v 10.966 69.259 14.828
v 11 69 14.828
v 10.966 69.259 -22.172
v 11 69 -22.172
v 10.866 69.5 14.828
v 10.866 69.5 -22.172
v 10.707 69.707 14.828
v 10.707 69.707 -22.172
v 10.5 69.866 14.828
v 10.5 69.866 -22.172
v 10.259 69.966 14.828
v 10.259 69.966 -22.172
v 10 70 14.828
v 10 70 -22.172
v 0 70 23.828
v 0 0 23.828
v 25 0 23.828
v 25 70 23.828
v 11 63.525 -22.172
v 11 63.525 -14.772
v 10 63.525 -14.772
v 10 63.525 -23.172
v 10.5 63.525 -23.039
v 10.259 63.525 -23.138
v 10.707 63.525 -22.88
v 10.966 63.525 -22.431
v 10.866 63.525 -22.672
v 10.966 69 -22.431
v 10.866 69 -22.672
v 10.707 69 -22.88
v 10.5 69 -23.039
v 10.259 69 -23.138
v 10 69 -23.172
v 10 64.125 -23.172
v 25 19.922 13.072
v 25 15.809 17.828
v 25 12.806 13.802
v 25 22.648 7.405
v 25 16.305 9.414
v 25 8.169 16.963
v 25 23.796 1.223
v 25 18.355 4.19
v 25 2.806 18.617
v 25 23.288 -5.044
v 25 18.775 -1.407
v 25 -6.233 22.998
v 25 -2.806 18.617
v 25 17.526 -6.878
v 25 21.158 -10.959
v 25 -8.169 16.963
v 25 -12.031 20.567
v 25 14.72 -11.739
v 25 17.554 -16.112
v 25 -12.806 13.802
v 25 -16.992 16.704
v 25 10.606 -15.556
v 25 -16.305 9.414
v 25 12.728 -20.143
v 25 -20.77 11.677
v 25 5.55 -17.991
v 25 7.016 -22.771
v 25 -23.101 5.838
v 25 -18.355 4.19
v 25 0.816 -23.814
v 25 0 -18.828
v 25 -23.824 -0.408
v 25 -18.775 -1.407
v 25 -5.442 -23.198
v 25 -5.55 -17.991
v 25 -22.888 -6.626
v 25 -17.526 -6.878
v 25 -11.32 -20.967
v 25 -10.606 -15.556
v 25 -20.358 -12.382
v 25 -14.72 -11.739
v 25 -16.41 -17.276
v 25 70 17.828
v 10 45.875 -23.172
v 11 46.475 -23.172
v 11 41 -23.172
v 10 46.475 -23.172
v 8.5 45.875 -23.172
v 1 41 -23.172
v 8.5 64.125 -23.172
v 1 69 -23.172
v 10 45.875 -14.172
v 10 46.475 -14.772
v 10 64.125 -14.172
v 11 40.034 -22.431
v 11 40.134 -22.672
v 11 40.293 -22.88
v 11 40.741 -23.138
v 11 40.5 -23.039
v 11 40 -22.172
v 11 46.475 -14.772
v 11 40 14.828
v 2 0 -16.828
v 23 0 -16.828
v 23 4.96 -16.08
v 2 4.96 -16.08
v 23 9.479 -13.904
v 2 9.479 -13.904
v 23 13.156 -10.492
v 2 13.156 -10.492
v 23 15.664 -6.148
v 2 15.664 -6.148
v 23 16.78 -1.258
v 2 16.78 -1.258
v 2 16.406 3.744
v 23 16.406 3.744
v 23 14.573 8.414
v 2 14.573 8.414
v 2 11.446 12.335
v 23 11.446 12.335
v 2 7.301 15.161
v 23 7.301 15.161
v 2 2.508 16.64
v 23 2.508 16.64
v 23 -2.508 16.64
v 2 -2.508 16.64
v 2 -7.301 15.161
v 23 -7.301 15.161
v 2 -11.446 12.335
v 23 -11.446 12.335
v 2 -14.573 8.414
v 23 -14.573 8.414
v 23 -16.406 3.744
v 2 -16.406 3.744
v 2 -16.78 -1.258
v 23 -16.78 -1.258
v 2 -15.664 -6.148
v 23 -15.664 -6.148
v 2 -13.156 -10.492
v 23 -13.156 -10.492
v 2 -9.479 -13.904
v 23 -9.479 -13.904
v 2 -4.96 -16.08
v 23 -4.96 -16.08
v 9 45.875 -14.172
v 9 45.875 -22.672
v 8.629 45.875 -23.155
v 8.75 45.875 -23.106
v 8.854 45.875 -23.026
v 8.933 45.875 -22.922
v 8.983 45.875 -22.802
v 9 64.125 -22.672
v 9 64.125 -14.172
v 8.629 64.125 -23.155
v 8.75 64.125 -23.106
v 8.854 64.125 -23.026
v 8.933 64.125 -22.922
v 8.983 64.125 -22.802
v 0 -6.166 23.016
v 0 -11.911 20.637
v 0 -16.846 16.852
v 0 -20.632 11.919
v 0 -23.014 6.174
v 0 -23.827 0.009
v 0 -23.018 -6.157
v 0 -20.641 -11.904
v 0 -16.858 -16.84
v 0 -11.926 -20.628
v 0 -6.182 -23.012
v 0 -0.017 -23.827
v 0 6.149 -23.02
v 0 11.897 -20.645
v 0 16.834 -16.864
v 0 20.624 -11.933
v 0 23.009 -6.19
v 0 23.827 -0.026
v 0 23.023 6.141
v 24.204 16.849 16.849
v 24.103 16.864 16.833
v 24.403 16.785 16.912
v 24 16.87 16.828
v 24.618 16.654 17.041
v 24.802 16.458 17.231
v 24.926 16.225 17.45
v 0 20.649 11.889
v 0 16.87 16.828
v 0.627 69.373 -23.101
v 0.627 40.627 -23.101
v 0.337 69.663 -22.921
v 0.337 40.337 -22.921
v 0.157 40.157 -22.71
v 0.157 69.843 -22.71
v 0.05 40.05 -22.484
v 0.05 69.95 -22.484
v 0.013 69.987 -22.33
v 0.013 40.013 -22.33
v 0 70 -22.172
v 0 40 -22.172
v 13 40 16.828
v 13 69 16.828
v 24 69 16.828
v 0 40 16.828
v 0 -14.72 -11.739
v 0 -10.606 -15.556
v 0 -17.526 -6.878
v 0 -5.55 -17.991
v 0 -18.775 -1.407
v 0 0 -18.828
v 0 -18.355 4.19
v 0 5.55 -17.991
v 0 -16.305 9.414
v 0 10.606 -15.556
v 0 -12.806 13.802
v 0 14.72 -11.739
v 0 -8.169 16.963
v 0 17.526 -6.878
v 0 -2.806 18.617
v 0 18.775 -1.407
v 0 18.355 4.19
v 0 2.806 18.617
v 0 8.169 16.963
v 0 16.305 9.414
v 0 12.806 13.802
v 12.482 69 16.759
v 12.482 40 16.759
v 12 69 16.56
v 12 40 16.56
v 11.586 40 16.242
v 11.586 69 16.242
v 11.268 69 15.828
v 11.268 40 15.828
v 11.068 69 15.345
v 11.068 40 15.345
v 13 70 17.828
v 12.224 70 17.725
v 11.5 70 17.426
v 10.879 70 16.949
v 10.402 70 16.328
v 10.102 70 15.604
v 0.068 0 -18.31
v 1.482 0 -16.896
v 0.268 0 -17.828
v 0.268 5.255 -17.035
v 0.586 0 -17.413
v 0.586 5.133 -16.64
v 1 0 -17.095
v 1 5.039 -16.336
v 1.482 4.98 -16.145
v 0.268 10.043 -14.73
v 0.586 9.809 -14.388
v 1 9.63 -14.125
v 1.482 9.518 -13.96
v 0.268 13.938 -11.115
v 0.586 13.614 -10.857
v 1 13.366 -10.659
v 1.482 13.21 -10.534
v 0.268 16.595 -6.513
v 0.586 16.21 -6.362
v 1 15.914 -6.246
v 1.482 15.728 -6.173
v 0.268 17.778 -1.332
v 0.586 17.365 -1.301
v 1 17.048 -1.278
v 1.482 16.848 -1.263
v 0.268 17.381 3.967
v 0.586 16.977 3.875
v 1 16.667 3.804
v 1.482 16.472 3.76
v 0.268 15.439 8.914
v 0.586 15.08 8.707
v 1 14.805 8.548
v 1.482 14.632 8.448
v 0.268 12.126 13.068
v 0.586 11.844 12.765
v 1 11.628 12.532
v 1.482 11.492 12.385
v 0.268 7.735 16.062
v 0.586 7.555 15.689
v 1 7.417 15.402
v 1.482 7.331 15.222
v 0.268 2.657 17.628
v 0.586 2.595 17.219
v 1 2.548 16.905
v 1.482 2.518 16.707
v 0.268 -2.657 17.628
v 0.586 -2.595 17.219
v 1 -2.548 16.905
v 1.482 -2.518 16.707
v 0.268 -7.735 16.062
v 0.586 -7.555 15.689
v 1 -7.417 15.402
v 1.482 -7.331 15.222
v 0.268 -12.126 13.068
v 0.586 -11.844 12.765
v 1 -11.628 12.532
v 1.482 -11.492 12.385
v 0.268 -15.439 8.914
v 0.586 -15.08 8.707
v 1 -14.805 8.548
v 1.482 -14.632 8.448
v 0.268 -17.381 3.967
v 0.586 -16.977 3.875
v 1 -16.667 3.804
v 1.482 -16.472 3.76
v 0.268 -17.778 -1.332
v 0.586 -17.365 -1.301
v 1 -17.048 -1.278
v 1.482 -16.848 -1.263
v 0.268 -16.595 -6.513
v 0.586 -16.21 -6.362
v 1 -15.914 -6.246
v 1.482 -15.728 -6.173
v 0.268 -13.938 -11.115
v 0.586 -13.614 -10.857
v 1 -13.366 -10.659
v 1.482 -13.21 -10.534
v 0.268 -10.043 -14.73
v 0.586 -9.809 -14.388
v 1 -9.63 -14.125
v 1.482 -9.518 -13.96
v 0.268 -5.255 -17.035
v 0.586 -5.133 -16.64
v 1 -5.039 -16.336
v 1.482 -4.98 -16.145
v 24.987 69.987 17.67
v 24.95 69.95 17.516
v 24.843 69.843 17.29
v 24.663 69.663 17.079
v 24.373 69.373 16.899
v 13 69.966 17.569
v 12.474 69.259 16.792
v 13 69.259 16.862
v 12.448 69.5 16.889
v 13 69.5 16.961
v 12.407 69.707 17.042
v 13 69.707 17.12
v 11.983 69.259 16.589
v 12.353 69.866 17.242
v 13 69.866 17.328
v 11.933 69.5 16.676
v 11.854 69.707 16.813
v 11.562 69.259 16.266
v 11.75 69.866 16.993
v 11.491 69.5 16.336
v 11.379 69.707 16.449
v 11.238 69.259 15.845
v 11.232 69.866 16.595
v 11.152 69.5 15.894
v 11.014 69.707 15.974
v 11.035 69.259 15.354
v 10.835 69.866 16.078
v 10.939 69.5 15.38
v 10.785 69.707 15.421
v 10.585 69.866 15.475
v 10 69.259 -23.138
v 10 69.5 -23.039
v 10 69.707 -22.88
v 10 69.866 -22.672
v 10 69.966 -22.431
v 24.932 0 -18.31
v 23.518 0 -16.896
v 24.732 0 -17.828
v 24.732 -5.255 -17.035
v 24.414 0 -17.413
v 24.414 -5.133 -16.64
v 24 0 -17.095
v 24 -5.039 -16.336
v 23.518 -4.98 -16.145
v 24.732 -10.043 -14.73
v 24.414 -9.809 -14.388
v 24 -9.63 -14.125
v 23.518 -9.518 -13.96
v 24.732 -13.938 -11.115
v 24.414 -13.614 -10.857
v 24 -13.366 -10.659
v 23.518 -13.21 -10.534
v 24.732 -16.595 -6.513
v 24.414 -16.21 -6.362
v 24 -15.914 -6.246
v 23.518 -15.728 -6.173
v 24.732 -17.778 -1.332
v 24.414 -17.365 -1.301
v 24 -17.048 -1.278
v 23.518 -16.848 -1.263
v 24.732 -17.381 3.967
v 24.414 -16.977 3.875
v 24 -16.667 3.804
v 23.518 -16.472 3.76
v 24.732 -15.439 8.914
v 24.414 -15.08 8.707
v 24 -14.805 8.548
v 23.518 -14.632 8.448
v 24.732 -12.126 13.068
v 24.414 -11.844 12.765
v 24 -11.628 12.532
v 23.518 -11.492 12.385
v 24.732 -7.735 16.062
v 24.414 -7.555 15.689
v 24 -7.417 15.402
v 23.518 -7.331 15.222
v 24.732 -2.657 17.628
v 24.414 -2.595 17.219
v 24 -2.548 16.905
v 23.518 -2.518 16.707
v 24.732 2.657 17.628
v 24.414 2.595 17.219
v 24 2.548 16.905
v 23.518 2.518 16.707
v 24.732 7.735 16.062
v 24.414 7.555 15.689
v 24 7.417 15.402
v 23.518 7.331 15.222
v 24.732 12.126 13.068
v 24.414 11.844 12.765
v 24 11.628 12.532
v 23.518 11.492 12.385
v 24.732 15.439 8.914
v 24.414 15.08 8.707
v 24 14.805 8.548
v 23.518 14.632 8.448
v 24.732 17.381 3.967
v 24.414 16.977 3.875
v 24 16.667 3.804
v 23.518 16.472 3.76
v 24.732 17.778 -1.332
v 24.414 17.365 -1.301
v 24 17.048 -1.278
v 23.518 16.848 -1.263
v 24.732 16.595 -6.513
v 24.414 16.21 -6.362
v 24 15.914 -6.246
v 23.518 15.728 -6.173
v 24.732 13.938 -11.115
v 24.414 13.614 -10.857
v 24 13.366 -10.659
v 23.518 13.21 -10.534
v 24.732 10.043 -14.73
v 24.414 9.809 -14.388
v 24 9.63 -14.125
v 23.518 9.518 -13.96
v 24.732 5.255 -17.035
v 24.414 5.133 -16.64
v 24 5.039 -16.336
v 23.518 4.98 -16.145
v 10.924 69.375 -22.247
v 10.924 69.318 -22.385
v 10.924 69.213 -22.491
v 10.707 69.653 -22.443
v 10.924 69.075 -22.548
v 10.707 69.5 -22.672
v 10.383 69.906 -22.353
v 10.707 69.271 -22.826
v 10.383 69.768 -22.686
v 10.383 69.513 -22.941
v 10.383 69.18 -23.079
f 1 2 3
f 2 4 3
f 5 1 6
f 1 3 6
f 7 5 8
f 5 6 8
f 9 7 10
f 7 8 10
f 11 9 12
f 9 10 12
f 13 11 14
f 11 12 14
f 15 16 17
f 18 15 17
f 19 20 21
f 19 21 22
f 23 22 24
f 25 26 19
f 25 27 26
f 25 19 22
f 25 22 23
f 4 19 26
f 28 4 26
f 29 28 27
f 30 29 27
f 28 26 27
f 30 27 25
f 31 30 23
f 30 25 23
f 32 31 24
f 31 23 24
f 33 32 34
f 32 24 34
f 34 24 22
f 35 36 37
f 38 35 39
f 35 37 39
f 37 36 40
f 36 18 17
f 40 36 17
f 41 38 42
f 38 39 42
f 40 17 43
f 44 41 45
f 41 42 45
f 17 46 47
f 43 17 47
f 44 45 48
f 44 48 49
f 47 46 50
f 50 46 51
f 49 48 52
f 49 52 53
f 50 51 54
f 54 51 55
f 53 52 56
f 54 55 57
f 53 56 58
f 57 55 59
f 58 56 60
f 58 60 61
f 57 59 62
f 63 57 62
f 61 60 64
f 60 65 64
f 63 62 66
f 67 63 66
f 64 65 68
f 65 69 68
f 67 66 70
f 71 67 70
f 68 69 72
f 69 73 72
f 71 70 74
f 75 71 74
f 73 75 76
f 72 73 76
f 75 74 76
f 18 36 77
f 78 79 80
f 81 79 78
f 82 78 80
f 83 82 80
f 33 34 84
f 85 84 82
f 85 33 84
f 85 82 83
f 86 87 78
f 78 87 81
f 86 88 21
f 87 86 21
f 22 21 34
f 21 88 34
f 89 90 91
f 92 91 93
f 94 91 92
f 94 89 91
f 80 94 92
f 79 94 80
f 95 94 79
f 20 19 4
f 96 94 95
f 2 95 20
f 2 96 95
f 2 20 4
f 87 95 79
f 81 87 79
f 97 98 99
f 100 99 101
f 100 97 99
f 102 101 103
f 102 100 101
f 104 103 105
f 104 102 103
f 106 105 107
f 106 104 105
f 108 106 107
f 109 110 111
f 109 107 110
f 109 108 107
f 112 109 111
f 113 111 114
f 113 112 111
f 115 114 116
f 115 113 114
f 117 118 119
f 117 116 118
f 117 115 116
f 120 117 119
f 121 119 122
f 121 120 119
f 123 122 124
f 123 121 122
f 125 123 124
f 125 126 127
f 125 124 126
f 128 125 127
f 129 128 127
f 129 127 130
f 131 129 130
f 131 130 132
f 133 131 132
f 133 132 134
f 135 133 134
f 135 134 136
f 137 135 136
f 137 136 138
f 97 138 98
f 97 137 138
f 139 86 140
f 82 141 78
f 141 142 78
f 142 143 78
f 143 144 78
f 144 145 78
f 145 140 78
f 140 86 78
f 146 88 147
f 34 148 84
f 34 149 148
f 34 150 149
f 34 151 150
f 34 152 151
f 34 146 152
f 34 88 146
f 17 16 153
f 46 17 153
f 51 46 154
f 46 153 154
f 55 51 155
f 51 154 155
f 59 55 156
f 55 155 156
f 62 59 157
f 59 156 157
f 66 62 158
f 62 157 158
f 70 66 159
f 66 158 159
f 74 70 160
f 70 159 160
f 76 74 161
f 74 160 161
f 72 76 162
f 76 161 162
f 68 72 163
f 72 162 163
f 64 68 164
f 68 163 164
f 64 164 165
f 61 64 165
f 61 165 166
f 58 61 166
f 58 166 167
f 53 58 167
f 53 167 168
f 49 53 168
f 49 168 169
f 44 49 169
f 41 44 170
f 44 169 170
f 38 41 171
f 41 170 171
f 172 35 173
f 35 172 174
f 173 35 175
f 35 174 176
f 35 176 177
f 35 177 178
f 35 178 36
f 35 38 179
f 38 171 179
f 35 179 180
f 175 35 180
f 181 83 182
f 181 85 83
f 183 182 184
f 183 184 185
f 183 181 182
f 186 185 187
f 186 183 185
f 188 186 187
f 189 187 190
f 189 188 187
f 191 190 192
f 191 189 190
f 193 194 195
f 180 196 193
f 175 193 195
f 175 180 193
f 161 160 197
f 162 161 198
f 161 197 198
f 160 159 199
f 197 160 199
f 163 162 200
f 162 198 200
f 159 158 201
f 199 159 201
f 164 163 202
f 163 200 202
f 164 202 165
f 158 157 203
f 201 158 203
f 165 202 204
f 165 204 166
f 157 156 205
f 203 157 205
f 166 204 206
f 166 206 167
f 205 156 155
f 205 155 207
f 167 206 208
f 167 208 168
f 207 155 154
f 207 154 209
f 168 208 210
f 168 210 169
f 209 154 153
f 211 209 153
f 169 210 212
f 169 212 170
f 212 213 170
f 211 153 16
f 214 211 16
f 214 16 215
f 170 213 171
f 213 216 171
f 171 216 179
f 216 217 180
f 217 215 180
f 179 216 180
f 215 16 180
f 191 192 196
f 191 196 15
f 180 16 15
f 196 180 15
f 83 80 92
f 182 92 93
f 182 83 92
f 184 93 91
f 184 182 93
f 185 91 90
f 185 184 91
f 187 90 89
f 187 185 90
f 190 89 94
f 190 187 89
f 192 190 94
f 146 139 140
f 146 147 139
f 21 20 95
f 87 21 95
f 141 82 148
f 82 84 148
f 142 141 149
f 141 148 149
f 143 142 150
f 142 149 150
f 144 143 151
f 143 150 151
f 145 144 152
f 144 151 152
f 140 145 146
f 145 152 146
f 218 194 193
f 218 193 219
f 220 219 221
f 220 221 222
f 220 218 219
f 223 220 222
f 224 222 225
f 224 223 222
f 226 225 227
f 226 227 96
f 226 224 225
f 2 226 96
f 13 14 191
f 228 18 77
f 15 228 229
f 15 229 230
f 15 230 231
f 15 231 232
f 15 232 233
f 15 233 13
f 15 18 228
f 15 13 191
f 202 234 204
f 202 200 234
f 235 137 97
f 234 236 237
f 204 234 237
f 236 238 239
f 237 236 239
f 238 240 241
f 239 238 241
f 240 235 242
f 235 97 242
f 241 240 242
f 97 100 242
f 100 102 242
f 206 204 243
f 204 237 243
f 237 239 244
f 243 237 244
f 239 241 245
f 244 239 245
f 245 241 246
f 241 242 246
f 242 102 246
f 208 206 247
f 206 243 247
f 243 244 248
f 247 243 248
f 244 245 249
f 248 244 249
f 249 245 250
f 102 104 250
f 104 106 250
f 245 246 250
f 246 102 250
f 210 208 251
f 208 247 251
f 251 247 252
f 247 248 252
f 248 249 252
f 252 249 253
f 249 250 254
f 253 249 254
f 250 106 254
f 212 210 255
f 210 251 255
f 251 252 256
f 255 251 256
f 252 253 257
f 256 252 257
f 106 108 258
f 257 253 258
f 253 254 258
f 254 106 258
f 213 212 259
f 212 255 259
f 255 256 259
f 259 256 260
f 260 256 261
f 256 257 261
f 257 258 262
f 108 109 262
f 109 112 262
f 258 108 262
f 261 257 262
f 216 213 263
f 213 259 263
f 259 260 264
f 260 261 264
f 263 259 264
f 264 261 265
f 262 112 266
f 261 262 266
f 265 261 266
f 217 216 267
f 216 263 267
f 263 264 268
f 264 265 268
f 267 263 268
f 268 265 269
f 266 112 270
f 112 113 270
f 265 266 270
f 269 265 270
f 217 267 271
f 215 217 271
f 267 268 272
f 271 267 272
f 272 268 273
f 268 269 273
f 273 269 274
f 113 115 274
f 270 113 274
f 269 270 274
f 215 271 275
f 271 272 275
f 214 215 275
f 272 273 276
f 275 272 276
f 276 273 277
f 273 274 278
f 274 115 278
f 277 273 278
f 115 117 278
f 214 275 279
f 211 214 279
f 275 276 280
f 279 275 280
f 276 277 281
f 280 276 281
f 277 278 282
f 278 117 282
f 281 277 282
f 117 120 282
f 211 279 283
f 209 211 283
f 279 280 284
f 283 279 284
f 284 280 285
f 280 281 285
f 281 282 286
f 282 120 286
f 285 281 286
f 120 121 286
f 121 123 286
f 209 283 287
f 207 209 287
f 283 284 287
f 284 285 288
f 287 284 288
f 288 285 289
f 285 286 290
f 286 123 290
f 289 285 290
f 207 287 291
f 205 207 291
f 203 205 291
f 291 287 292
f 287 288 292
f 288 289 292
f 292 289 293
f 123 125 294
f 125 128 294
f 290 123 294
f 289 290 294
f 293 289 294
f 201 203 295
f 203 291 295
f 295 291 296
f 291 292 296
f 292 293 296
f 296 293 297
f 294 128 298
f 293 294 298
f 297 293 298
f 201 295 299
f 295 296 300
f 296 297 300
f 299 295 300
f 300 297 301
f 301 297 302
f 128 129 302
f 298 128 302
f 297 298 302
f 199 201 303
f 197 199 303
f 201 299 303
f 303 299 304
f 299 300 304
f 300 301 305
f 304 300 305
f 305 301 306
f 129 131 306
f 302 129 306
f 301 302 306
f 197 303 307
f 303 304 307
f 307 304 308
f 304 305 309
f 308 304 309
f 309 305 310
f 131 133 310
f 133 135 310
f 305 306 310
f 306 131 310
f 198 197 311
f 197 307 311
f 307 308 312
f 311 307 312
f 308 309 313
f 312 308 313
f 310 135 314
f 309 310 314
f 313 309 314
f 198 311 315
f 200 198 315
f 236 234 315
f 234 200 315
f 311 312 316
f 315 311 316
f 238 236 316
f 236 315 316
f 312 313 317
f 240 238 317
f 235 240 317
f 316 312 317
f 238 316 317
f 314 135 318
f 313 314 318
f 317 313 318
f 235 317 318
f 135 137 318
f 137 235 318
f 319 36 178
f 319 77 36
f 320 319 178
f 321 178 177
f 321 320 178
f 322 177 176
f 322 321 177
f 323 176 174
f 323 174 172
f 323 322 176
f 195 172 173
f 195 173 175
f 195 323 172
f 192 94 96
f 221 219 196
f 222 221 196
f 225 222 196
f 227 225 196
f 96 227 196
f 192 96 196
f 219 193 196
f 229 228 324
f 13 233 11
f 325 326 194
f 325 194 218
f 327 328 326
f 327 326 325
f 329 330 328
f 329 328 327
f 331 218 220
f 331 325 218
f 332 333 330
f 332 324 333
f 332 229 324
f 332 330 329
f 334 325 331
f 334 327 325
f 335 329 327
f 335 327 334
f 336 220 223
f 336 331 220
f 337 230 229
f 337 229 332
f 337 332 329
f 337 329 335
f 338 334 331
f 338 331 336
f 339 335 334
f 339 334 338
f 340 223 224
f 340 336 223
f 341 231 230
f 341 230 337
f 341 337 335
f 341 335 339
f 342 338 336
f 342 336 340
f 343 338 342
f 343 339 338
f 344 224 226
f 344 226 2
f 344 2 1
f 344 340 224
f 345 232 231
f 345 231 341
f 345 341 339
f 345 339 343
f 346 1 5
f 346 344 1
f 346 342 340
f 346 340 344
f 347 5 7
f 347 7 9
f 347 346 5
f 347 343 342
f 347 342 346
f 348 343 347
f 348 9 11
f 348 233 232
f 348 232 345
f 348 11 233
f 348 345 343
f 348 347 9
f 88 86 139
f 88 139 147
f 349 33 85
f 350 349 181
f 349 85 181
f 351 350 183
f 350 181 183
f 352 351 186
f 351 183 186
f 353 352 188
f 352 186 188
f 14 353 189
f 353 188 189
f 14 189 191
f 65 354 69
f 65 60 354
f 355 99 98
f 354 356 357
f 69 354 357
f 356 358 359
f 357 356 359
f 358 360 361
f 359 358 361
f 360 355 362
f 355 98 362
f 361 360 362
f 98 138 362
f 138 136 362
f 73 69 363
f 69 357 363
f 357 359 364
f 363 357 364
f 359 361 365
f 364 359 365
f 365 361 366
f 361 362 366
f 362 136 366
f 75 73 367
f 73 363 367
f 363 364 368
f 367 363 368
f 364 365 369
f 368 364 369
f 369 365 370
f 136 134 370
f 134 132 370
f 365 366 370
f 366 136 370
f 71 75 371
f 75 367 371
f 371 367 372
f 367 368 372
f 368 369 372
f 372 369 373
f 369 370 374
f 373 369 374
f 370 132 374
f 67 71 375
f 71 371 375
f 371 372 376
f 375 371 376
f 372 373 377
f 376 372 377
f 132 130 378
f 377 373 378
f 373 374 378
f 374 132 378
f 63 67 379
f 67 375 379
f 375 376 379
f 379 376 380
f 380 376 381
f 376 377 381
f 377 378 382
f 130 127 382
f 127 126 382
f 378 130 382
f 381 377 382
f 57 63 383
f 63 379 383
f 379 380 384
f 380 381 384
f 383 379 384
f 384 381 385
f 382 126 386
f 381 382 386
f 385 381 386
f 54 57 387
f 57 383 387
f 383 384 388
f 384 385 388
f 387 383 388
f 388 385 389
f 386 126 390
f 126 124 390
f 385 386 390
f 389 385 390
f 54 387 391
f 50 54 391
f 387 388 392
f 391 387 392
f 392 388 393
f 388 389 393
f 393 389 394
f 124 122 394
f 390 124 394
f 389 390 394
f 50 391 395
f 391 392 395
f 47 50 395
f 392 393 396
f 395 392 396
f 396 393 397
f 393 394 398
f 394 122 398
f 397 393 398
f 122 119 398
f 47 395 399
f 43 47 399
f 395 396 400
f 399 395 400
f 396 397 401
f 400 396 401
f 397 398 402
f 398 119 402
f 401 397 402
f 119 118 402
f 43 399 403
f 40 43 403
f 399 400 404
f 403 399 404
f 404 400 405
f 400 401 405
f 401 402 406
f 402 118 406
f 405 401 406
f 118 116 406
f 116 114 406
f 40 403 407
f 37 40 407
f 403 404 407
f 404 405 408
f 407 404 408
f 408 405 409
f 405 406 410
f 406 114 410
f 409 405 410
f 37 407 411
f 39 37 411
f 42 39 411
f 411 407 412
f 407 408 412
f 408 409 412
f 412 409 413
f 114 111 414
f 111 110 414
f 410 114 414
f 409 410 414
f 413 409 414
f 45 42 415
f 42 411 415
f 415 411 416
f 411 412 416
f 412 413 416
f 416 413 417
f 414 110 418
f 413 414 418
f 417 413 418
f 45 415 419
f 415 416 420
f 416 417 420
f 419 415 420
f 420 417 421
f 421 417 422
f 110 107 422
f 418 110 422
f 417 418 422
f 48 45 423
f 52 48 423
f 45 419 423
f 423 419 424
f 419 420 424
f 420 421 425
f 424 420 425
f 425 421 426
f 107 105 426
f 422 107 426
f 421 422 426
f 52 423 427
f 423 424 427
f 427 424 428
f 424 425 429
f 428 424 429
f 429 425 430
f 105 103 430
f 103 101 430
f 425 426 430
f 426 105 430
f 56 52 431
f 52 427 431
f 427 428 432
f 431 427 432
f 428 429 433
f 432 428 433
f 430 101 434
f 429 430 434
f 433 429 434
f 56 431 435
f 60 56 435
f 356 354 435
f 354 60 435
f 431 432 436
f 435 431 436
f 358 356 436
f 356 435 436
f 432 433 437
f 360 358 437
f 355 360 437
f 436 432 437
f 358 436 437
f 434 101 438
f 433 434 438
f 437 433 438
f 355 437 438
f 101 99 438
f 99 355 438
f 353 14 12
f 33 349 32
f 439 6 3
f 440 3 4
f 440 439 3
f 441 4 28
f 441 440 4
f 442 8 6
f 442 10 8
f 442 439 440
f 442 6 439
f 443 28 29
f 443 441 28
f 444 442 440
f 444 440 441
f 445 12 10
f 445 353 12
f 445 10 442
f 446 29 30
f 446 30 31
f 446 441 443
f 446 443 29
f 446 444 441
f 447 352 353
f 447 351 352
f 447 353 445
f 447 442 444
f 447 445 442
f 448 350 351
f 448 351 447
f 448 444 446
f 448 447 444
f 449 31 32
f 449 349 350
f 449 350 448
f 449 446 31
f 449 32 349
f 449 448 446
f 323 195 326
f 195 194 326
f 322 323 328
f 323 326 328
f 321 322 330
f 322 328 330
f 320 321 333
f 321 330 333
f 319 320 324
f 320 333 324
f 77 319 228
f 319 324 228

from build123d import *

# Parameters (mm, degrees)
SKETCH1_R           = 23.8275
SKETCH1_R_2         = 16.8275
BOSS_EXTRUDE1_DEPTH = 25
SKETCH2_W           = 25
SKETCH2_H           = 7
BOSS_EXTRUDE2_DEPTH = 70
SKETCH3_W           = 11
SKETCH3_H           = 30
BOSS_EXTRUDE3_DEPTH = 40
SKETCH4_W           = 8.4
SKETCH4_H           = 8.525
CUT_EXTRUDE1_DEPTH  = 1
SKETCH5_W           = 9
SKETCH5_H           = 18.25
CUT_EXTRUDE2_DEPTH  = 1
FILLET1_R           = 0.5
FILLET2_R           = 1
FILLET3_R           = 2
FILLET4_R           = 2
FILLET6_R           = 1


with BuildPart() as part:
    # Sketch1 → Boss-Extrude1 (new body)
    with BuildSketch(Plane(origin=(0, 0, 0), x_dir=(0, 0, -1), z_dir=(1, 0, 0))):
        Circle(SKETCH1_R)
        Circle(SKETCH1_R_2, mode=Mode.SUBTRACT)
    extrude(amount=BOSS_EXTRUDE1_DEPTH)

    # Sketch2 → Boss-Extrude2 (add)
    with BuildSketch(Plane(origin=(0, 0, 0), x_dir=(1, 0, 0), z_dir=(0, 1, 0))):
        with Locations((12.5, -20.3275)):
            Rectangle(SKETCH2_W, SKETCH2_H)
    extrude(amount=BOSS_EXTRUDE2_DEPTH)

    # Sketch3 → Boss-Extrude3 (add)
    with BuildSketch(Plane(origin=(0, 0, 16.8275), x_dir=(-1, 0, 0), z_dir=(0, 0, -1))):
        with Locations((-5.5, 55)):
            Rectangle(SKETCH3_W, SKETCH3_H)
    extrude(amount=BOSS_EXTRUDE3_DEPTH)

    # Sketch4 → Cut-Extrude1 (cut)
    with BuildSketch(Plane(origin=(11, 0, 0), x_dir=(0, 0, -1), z_dir=(1, 0, 0))):
        with Locations((18.9725, 50.7375)):
            Rectangle(SKETCH4_W, SKETCH4_H)
        with Locations((18.9725, 59.2625)):
            Rectangle(SKETCH4_W, SKETCH4_H)
    extrude(amount=-CUT_EXTRUDE1_DEPTH, mode=Mode.SUBTRACT)

    # Sketch5 → Cut-Extrude2 (cut)
    with BuildSketch(Plane(origin=(10, 0, 0), x_dir=(0, 0, -1), z_dir=(1, 0, 0))):
        with Locations((18.6725, 55)):
            Rectangle(SKETCH5_W, SKETCH5_H)
    extrude(amount=-CUT_EXTRUDE2_DEPTH, mode=Mode.SUBTRACT)

    # Fillet1
    fillet1_edges = [part.edges().sort_by_distance(p)[0] for p in [
        (9, 55, -23.1725),
    ]]
    fillet(fillet1_edges, radius=FILLET1_R)

    # Fillet2
    fillet2_edges = [part.edges().sort_by_distance(p)[0] for p in [
        (0, 55, -23.1725),
        (5.5, 70, -23.1725),
        (5.5, 40, -23.1725),
    ]]
    fillet(fillet2_edges, radius=FILLET2_R)

    # Fillet3
    fillet3_edges = [part.edges().sort_by_distance(p)[0] for p in [
        (0, 0, 16.8275),
        (25, 0, 16.8275),
    ]]
    fillet(fillet3_edges, radius=FILLET3_R)

    # Fillet4
    fillet4_edges = [part.edges().sort_by_distance(p)[0] for p in [
        (11, 55, 16.8275),
    ]]
    fillet(fillet4_edges, radius=FILLET4_R)

    # Fillet6
    fillet6_edges = [part.edges().sort_by_distance(p)[0] for p in [
        (11.585786438, 70, 16.241713562),
        (25, 43.43482365, 16.8275),
        (19, 70, 16.8275),
        (11, 66.2625, -23.1725),
        (11, 70, -3.6725),
        (11, 69.707106781, -22.879606781),
    ]]
    fillet(fillet6_edges, radius=FILLET6_R)


solid = part.part
